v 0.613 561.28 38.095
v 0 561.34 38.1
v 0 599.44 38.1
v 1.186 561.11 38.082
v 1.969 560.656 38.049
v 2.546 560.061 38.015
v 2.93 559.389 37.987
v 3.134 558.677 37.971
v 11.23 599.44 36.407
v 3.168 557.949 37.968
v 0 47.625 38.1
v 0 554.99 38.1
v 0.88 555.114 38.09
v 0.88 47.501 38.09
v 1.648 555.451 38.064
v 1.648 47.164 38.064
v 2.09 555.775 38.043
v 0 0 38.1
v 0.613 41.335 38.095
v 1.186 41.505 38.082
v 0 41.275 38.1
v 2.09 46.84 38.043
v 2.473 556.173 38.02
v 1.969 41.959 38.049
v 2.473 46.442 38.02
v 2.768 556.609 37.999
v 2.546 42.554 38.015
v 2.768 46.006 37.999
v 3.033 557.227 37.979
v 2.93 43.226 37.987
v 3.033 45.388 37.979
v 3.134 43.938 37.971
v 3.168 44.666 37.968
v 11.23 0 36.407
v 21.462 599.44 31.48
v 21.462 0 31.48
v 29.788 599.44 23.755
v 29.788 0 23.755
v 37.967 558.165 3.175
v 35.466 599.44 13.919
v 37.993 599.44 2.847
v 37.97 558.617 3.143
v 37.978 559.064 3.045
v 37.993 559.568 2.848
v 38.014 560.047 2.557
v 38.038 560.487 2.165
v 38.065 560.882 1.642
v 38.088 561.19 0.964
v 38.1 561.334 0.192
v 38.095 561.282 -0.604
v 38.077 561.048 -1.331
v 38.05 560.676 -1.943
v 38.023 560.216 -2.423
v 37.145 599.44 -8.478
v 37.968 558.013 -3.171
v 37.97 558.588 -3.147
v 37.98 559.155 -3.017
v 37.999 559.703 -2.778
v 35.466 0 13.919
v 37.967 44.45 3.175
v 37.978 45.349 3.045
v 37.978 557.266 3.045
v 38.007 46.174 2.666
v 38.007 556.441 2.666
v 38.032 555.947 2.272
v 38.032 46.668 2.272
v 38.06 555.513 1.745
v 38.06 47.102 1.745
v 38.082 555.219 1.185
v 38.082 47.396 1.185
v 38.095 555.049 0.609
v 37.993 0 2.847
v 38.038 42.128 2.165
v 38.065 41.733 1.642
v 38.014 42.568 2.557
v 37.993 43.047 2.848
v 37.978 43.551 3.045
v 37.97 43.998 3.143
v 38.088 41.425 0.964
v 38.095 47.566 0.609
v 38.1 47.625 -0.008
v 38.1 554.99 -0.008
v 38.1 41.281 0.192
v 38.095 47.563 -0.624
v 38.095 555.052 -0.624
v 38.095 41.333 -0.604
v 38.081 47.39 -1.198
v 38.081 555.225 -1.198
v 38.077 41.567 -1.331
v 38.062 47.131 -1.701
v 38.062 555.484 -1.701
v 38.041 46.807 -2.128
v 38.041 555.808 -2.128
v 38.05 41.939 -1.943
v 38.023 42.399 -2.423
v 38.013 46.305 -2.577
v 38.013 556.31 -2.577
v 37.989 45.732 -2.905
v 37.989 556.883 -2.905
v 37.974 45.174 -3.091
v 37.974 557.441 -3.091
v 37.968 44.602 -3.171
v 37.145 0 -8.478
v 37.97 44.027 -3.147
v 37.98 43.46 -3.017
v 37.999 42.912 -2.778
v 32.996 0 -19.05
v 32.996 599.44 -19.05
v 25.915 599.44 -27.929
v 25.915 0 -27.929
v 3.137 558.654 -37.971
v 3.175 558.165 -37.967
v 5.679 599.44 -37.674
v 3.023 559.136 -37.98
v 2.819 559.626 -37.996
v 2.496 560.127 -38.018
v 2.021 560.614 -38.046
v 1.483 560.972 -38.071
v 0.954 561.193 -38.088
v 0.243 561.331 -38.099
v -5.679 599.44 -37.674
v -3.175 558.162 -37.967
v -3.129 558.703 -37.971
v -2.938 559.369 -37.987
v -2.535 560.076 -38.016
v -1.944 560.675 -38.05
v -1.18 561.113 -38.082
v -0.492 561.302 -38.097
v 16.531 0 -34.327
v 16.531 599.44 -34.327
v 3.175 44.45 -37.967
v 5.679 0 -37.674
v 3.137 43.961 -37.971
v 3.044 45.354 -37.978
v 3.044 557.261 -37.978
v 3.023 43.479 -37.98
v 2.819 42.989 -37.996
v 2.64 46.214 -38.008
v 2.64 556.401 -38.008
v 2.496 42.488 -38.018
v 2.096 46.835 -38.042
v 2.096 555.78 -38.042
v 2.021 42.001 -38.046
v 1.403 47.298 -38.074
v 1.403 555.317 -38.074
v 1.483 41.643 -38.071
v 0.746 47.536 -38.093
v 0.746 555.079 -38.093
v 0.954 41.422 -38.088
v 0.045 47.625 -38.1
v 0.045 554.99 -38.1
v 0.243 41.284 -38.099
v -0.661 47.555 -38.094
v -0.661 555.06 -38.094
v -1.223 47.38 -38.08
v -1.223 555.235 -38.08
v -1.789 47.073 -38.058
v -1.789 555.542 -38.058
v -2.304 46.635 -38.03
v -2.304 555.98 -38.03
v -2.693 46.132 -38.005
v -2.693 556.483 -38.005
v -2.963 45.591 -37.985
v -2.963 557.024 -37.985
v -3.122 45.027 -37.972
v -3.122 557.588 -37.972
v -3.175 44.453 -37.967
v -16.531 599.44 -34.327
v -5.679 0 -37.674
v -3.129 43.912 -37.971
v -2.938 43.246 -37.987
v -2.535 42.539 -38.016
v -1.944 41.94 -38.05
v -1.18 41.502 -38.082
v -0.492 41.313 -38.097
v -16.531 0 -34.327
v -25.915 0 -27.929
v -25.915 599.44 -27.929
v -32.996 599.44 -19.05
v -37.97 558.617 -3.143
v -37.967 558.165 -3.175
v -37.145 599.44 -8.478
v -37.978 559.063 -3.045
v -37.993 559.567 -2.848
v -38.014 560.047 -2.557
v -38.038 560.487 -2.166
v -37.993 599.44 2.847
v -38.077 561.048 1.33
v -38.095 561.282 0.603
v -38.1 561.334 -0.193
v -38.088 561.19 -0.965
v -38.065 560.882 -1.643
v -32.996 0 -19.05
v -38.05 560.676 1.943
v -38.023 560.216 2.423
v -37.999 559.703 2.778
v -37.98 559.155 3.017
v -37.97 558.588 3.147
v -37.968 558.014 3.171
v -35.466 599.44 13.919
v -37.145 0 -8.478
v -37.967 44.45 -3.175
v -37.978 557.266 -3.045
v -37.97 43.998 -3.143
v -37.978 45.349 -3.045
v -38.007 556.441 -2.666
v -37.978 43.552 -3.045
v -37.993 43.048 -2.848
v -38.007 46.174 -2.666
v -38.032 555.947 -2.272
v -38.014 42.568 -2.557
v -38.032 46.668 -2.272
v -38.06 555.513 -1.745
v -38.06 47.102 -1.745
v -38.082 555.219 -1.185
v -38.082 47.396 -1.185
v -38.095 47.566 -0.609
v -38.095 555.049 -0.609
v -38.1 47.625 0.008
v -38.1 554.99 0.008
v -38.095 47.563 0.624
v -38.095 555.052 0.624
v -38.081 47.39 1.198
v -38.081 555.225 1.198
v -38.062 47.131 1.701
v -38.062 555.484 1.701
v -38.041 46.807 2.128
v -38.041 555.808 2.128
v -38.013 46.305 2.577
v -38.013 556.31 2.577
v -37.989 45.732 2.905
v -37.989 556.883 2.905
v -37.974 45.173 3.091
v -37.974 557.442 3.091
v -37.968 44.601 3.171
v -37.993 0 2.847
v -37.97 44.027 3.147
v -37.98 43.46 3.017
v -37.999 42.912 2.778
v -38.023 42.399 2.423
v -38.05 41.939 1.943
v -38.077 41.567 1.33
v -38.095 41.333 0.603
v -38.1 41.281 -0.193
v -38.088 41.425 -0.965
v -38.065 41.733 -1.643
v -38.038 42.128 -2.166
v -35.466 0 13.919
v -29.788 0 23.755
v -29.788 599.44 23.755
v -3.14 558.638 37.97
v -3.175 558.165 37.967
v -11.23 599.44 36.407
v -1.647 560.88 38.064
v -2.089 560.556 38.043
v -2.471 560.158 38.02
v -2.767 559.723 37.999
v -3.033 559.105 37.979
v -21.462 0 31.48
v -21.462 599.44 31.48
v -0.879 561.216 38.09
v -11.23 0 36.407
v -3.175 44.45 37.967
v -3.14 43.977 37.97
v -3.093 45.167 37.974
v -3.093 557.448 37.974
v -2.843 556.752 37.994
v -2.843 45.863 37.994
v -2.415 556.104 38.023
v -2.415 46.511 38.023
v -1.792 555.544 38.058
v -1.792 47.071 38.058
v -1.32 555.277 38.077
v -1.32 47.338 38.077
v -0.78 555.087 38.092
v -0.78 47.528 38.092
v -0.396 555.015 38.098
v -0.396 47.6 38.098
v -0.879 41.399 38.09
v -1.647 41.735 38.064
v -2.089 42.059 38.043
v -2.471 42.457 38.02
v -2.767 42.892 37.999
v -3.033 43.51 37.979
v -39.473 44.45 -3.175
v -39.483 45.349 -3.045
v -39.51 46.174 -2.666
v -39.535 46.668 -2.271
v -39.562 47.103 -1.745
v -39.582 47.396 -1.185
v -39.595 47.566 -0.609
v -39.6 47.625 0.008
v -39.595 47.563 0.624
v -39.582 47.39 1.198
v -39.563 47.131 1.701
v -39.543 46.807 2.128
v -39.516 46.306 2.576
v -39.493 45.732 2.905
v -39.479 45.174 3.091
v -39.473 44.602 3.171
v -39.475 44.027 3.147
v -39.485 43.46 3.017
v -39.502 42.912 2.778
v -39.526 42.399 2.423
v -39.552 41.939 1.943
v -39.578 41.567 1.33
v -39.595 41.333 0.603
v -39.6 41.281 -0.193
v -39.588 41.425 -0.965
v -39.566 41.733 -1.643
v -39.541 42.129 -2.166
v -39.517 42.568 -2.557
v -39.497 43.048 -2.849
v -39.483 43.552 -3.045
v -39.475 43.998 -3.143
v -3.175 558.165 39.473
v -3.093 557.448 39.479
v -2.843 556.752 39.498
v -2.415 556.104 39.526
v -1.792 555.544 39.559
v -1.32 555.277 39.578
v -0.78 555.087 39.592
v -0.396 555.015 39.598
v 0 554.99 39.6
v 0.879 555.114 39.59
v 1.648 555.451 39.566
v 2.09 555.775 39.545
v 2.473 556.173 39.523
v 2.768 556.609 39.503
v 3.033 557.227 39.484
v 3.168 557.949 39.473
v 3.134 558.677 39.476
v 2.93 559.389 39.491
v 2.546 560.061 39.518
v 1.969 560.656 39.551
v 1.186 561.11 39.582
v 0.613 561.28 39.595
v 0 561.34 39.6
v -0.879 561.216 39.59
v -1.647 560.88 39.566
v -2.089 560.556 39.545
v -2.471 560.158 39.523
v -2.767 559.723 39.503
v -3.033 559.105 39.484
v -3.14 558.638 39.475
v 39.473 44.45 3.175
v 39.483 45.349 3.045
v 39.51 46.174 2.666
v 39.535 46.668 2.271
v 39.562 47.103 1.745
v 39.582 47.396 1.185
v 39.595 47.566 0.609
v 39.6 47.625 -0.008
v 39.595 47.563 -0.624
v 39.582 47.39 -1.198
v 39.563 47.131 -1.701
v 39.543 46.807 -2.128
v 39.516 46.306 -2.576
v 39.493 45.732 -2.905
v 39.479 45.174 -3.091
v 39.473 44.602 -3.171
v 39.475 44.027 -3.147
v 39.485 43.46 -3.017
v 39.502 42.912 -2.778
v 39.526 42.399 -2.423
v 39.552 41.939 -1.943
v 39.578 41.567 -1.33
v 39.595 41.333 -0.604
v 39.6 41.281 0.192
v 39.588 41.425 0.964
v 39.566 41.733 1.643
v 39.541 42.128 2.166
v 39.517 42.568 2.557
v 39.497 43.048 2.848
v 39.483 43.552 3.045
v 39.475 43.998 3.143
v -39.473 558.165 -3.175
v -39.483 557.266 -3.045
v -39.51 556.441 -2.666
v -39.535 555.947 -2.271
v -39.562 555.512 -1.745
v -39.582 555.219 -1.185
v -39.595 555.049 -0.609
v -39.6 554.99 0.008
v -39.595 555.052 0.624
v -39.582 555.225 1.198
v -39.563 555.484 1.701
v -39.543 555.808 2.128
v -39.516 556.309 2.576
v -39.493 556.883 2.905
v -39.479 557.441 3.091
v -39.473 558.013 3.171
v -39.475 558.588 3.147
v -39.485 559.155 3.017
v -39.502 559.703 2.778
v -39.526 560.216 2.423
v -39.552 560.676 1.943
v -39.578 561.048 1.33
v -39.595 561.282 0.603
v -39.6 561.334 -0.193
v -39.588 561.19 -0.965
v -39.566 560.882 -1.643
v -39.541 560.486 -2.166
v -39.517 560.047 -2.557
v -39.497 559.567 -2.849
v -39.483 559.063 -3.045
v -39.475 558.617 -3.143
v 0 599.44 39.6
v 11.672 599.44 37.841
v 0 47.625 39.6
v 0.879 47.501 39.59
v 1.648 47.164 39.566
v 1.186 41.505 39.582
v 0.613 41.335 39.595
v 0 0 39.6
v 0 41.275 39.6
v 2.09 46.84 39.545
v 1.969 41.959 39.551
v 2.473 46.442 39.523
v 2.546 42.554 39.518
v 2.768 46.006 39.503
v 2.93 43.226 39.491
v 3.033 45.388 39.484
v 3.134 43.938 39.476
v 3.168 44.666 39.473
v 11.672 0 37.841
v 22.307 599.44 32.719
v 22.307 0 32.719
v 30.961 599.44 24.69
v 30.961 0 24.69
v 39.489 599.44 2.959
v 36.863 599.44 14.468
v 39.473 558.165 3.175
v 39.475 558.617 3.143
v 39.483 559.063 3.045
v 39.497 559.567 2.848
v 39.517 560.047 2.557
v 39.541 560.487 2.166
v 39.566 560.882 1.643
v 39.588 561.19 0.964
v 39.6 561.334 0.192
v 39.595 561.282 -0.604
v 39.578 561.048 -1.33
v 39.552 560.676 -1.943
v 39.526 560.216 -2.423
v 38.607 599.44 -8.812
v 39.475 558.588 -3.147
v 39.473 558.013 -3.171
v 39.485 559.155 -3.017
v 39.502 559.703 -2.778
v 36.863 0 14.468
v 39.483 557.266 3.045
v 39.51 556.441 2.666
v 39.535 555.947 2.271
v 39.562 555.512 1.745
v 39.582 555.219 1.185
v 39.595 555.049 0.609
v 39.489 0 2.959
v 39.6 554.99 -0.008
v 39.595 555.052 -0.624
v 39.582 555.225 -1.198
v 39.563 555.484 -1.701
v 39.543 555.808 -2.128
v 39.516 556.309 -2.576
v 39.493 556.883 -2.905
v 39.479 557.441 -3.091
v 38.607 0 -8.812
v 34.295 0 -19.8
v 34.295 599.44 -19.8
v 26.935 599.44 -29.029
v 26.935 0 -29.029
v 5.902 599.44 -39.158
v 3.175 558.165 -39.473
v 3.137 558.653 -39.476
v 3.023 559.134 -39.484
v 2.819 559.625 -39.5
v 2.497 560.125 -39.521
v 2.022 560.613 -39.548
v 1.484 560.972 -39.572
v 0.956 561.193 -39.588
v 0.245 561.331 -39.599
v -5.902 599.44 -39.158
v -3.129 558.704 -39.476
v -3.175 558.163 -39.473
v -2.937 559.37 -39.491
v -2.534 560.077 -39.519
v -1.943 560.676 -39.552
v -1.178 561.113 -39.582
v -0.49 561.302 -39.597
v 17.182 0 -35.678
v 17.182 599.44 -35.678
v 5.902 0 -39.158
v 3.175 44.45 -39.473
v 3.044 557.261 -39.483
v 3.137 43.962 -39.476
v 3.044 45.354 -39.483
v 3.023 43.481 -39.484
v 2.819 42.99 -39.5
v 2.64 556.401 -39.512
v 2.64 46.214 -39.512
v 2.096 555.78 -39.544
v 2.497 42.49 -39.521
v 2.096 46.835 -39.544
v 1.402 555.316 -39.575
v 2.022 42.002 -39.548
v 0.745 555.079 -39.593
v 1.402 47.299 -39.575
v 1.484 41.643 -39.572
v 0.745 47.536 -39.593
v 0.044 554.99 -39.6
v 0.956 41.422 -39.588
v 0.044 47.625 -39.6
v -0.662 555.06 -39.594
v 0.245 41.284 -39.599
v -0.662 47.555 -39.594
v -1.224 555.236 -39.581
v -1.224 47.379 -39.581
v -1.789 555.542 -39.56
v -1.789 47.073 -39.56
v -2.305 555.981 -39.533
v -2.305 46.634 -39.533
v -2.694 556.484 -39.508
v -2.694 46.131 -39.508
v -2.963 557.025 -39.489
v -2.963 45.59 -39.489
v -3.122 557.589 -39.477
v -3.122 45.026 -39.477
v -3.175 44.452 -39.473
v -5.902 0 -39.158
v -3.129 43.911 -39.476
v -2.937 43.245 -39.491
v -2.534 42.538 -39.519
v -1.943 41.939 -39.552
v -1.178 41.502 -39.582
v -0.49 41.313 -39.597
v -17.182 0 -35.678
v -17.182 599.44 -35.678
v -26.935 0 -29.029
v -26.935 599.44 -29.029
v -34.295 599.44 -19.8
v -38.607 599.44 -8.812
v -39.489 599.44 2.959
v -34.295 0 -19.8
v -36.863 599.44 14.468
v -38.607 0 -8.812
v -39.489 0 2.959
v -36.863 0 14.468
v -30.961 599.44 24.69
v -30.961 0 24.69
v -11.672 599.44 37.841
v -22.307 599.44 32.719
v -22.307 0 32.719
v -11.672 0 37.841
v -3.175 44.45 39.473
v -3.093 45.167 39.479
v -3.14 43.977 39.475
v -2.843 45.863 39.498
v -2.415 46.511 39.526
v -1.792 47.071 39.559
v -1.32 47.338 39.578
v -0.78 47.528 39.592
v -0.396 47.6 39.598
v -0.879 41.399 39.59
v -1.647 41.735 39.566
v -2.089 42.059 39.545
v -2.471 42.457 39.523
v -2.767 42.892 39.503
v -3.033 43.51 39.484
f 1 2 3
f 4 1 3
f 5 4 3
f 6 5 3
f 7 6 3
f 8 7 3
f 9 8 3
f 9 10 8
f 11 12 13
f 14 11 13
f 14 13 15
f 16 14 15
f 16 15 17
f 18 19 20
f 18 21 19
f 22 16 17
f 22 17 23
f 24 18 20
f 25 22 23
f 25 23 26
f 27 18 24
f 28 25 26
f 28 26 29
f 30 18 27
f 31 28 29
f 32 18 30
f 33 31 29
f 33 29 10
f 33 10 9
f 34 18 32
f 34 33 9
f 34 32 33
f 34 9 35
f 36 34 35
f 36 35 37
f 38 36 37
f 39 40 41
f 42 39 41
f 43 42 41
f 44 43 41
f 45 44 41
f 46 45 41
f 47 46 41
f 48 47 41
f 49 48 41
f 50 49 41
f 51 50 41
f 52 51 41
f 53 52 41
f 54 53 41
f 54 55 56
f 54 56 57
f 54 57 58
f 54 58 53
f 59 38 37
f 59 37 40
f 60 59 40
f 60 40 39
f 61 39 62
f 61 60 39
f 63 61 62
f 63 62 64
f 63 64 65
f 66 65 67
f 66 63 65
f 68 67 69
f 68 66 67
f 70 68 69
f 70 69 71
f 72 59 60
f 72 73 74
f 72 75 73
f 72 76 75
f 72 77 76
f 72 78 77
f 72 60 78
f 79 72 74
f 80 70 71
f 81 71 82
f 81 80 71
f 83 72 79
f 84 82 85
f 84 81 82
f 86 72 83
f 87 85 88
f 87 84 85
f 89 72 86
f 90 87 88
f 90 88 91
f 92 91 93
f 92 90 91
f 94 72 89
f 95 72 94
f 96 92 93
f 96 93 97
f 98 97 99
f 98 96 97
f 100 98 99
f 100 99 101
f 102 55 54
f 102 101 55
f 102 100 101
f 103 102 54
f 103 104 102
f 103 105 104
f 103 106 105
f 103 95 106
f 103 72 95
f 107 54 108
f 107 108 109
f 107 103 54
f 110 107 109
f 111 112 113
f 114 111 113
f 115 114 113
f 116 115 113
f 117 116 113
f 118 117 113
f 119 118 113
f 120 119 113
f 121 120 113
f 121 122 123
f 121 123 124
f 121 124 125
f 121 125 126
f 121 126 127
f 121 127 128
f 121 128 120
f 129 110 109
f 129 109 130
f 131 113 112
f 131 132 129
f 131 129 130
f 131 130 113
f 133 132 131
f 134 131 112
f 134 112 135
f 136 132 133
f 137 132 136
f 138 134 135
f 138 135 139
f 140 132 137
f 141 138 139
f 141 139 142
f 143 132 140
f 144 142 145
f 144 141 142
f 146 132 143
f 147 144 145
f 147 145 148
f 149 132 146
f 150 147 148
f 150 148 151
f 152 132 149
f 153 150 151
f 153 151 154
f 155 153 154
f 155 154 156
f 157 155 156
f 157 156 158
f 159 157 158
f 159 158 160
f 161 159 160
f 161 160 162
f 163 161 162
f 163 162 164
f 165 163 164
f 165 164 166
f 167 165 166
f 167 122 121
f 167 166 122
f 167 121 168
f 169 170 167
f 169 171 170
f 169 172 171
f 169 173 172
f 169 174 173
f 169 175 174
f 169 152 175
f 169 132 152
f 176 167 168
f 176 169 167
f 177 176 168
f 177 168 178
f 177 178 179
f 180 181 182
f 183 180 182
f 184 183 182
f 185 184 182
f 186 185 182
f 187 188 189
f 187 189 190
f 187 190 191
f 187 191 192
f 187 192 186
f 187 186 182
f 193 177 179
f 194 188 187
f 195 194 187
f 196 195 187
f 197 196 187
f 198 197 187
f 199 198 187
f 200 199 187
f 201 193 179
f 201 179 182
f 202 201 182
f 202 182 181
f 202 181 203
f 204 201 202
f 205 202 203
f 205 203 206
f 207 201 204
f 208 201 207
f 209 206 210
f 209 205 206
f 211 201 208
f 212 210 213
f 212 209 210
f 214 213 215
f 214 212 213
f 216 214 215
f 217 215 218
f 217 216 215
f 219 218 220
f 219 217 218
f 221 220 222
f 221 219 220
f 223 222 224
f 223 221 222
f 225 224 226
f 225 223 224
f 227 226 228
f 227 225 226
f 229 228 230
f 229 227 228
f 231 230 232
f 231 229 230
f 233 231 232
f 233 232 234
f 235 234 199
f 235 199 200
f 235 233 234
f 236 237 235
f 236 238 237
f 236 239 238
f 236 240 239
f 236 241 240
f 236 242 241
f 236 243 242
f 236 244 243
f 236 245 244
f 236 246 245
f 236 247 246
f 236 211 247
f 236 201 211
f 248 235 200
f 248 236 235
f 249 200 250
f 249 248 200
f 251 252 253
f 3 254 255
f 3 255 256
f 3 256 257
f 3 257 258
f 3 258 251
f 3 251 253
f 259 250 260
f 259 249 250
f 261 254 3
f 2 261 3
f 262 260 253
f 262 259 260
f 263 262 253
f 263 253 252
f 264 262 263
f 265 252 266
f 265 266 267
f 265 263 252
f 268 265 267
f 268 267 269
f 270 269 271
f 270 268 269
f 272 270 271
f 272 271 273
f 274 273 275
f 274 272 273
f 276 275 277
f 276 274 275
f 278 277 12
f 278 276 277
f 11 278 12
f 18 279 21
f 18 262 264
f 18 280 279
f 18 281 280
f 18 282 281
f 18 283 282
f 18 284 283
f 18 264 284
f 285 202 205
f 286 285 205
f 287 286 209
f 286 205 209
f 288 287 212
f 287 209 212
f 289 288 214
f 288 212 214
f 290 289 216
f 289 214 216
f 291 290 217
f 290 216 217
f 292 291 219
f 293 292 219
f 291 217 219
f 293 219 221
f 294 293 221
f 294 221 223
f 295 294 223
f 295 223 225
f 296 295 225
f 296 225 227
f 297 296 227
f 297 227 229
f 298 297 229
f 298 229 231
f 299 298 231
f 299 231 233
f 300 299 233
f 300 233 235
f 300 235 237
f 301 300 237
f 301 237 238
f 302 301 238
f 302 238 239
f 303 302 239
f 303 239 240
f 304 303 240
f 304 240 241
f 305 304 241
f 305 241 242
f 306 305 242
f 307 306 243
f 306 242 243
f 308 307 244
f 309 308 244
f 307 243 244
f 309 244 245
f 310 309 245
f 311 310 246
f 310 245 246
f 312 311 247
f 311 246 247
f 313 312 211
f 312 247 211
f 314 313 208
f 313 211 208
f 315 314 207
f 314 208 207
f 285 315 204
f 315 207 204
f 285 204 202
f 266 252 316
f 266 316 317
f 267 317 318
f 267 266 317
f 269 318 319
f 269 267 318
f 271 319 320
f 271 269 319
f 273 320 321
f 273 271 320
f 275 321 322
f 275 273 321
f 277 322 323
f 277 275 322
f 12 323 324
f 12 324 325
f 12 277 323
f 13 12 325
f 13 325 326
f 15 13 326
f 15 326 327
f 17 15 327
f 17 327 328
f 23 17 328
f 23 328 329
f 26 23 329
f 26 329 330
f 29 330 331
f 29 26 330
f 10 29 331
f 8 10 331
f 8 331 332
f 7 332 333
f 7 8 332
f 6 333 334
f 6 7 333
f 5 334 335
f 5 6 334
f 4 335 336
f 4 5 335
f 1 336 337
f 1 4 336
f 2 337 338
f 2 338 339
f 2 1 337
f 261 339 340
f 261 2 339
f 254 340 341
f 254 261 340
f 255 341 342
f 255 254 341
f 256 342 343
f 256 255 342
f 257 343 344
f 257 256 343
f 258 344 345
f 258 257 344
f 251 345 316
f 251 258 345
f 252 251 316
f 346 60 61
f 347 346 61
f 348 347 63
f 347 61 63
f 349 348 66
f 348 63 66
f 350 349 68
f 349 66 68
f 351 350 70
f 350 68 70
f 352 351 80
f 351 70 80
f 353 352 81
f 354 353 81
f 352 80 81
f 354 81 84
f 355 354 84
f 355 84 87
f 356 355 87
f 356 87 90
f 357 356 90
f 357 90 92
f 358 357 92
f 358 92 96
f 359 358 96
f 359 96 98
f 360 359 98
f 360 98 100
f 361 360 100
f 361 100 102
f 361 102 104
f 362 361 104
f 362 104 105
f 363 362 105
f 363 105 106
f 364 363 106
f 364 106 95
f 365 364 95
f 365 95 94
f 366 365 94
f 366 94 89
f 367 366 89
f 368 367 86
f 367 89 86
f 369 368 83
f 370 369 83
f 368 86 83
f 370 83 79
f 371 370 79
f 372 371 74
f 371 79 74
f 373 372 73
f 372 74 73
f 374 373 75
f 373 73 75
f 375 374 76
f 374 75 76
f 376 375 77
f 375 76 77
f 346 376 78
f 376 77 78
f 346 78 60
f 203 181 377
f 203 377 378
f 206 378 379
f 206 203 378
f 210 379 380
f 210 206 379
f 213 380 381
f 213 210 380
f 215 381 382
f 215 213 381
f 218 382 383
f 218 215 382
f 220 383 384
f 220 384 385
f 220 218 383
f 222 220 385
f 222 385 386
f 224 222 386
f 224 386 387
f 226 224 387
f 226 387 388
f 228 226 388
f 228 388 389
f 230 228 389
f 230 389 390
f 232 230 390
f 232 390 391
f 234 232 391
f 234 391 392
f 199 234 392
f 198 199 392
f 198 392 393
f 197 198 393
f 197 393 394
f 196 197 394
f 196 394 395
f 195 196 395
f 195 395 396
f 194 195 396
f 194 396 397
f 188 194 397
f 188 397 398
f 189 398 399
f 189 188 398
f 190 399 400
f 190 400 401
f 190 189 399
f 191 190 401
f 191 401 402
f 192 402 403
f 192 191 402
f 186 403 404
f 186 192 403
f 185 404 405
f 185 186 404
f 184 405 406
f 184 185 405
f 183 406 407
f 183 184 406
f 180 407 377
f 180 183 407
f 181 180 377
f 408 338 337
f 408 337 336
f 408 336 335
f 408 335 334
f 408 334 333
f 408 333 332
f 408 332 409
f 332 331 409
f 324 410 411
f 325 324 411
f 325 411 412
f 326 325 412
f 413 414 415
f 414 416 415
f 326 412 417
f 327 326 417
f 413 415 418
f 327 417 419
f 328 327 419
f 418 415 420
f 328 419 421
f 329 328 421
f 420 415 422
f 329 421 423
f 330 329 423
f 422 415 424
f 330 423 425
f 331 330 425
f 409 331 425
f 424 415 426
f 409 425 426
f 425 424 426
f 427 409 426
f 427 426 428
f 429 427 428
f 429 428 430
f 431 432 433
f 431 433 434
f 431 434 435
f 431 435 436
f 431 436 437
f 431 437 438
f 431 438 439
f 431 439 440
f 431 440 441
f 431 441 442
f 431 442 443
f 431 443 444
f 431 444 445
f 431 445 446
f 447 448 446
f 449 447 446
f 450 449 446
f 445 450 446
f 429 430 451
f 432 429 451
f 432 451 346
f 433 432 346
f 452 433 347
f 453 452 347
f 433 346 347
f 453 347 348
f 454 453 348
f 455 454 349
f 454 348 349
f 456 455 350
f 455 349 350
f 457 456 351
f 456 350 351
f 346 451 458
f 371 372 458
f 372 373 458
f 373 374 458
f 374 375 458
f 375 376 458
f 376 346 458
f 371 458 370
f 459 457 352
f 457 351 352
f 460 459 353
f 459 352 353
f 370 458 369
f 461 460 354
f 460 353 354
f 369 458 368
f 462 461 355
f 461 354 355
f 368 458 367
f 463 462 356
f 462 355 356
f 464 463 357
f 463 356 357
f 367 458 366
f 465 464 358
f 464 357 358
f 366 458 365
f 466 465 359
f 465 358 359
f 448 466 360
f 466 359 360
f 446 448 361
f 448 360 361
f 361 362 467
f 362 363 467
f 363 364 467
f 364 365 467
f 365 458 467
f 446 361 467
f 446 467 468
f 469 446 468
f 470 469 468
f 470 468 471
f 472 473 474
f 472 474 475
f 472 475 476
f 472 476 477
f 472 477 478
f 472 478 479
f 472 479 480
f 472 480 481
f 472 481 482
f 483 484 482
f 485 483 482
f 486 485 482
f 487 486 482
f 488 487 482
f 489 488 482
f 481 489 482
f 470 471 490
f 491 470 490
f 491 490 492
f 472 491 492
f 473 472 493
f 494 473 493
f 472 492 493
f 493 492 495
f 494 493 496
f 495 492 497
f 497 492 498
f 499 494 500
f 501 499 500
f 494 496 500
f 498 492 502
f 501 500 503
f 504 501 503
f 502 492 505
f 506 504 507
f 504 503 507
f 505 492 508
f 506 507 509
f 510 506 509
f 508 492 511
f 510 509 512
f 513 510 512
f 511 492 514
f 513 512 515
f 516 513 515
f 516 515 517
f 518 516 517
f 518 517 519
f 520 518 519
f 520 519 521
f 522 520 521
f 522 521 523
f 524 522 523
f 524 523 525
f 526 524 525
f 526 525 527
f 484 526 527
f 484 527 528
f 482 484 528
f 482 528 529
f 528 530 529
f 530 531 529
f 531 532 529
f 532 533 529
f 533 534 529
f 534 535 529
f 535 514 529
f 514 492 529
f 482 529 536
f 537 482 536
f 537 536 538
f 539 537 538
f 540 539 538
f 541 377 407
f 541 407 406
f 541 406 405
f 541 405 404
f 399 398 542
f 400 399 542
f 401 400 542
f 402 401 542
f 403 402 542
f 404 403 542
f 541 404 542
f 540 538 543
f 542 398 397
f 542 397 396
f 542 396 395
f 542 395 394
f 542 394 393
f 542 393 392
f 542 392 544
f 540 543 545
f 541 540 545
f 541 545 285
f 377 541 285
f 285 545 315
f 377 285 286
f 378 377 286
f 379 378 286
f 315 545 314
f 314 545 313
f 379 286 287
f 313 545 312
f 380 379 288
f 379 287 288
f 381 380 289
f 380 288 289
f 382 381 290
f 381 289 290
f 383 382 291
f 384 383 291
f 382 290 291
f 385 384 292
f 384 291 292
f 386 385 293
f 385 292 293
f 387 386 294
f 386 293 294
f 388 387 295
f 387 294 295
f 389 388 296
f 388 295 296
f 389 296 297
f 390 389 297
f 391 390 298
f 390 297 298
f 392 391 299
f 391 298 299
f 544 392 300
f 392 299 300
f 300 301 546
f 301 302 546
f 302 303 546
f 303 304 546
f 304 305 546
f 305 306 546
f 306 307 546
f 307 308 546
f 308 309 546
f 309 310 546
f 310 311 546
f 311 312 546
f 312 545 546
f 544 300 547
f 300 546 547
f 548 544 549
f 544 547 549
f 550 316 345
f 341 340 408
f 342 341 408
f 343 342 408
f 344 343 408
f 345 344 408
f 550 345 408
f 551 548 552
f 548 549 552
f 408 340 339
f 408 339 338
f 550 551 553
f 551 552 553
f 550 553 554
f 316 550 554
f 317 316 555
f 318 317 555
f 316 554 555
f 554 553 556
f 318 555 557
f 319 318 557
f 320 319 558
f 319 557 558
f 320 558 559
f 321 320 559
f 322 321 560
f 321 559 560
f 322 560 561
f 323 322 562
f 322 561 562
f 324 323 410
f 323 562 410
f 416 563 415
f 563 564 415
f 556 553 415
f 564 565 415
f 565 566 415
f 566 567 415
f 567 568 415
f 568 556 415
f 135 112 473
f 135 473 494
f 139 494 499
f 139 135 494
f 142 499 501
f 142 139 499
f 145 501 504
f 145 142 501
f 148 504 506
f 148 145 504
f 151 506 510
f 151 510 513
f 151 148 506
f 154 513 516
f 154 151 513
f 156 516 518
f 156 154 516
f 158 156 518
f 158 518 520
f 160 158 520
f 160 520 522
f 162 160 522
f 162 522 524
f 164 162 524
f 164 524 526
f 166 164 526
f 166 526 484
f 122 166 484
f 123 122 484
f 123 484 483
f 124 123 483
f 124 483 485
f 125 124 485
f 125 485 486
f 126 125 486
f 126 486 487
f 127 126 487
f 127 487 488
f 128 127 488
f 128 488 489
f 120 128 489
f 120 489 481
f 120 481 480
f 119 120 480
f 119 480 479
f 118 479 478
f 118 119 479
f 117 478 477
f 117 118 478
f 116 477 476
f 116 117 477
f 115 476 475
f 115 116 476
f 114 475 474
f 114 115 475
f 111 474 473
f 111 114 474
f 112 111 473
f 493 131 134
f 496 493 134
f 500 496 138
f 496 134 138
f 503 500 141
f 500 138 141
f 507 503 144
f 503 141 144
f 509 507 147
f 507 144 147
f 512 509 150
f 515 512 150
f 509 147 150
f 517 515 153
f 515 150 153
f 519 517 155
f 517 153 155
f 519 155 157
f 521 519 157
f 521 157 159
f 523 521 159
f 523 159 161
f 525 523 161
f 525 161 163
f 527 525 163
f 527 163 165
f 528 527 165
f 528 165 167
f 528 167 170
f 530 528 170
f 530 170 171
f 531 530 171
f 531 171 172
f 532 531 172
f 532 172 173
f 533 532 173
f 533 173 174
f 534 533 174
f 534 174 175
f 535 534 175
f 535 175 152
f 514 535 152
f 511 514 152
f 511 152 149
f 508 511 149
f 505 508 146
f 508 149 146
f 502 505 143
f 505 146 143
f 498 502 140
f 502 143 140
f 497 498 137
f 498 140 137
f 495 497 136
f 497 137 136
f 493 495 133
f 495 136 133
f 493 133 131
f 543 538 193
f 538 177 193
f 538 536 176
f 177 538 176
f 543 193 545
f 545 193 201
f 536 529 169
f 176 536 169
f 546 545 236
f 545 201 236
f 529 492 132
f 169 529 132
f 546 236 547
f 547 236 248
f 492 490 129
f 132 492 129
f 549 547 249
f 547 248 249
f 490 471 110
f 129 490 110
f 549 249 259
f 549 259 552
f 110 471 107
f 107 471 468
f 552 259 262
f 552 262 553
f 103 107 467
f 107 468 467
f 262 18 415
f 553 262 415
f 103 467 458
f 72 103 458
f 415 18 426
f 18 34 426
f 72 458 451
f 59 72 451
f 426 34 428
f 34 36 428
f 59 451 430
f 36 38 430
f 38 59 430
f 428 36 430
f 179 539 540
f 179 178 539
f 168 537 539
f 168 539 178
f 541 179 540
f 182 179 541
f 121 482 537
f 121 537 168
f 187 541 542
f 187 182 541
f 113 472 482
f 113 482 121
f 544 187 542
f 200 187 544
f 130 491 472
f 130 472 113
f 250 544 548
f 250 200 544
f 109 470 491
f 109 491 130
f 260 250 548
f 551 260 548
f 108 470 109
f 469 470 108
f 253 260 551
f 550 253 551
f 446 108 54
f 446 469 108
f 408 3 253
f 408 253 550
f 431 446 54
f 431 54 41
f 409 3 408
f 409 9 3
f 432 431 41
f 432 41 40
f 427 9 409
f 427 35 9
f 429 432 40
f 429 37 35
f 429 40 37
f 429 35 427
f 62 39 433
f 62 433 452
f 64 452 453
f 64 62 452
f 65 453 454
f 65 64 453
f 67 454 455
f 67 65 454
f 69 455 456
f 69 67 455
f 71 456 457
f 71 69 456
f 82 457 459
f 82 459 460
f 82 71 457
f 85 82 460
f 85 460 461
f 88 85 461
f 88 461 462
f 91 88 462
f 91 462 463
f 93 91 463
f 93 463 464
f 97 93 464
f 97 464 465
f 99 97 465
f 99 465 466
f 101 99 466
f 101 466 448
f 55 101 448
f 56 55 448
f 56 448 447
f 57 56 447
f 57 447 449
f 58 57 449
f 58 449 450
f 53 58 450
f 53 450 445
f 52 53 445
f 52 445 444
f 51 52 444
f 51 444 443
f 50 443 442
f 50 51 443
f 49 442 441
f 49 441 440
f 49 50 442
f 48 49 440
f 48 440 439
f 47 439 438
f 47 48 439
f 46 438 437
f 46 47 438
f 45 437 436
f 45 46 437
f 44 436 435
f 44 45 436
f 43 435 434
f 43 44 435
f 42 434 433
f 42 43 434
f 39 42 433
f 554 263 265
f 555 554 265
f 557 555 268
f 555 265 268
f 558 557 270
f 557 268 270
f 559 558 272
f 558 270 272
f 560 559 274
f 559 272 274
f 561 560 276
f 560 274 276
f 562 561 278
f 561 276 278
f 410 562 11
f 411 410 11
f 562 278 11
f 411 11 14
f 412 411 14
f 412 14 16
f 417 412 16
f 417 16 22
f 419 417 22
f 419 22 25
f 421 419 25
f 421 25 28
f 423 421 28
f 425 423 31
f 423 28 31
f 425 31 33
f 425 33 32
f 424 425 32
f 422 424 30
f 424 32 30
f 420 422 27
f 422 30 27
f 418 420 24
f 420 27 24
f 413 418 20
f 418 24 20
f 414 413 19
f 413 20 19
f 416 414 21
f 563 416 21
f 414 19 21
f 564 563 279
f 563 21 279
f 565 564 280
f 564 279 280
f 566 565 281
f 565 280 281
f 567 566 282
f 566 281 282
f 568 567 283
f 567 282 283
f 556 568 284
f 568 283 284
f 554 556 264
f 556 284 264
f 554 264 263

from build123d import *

# Parameters (mm, degrees)
SKETCH4_R           = 39.6
SKETCH4_R_2         = 38.1
BOSS_EXTRUDE2_DEPTH = 599.44
SKETCH5_R           = 3.175
CUT_EXTRUDE1_DEPTH  = 603.050358027
CIRPATTERN1_COUNT   = 4
SKETCH6_R           = 3.175
CUT_EXTRUDE2_DEPTH  = 603.050358139
CIRPATTERN2_COUNT   = 4


with BuildPart() as part:
    # Sketch4 → Boss-Extrude2 (new body)
    with BuildSketch(Plane(origin=(0, 0, 0), x_dir=(1, 0, 0), z_dir=(0, 1, 0))):
        with Locations(Location((0, 0, 0), (0, 0, 270))):
            Circle(SKETCH4_R)
        with Locations(Location((0, 0, 0), (0, 0, 270))):
            Circle(SKETCH4_R_2, mode=Mode.SUBTRACT)
    extrude(amount=BOSS_EXTRUDE2_DEPTH)

    # Sketch5 → Cut-Extrude1 (cut, through all)
    with BuildSketch(Plane(origin=(0, 0, 0), x_dir=(0, 0, -1), z_dir=(1, 0, 0))):
        with Locations((0, 44.45)):
            Circle(SKETCH5_R)
    cut_extrude1 = extrude(amount=-CUT_EXTRUDE1_DEPTH, mode=Mode.SUBTRACT)

    # CirPattern1: Cut-Extrude1 ×4 about axis
    cirpattern1_axis = Axis((0, 599.44, 0), (0, -1, 0))
    for i in range(1, CIRPATTERN1_COUNT):
        add(cut_extrude1.rotate(cirpattern1_axis, i * 360 / CIRPATTERN1_COUNT), mode=Mode.SUBTRACT)

    # Sketch6 → Cut-Extrude2 (cut, through all)
    with BuildSketch(Plane(origin=(0, 0, 0), x_dir=(0, 0, -1), z_dir=(1, 0, 0))):
        with Locations(Location((0, 558.165, 0), (0, 0, 180))):
            Circle(SKETCH6_R)
    cut_extrude2 = extrude(amount=CUT_EXTRUDE2_DEPTH, mode=Mode.SUBTRACT)

    # CirPattern2: Cut-Extrude2 ×4 about axis
    cirpattern2_axis = Axis((0, 599.44, 0), (0, -1, 0))
    for i in range(1, CIRPATTERN2_COUNT):
        add(cut_extrude2.rotate(cirpattern2_axis, i * 360 / CIRPATTERN2_COUNT), mode=Mode.SUBTRACT)


solid = part.part
